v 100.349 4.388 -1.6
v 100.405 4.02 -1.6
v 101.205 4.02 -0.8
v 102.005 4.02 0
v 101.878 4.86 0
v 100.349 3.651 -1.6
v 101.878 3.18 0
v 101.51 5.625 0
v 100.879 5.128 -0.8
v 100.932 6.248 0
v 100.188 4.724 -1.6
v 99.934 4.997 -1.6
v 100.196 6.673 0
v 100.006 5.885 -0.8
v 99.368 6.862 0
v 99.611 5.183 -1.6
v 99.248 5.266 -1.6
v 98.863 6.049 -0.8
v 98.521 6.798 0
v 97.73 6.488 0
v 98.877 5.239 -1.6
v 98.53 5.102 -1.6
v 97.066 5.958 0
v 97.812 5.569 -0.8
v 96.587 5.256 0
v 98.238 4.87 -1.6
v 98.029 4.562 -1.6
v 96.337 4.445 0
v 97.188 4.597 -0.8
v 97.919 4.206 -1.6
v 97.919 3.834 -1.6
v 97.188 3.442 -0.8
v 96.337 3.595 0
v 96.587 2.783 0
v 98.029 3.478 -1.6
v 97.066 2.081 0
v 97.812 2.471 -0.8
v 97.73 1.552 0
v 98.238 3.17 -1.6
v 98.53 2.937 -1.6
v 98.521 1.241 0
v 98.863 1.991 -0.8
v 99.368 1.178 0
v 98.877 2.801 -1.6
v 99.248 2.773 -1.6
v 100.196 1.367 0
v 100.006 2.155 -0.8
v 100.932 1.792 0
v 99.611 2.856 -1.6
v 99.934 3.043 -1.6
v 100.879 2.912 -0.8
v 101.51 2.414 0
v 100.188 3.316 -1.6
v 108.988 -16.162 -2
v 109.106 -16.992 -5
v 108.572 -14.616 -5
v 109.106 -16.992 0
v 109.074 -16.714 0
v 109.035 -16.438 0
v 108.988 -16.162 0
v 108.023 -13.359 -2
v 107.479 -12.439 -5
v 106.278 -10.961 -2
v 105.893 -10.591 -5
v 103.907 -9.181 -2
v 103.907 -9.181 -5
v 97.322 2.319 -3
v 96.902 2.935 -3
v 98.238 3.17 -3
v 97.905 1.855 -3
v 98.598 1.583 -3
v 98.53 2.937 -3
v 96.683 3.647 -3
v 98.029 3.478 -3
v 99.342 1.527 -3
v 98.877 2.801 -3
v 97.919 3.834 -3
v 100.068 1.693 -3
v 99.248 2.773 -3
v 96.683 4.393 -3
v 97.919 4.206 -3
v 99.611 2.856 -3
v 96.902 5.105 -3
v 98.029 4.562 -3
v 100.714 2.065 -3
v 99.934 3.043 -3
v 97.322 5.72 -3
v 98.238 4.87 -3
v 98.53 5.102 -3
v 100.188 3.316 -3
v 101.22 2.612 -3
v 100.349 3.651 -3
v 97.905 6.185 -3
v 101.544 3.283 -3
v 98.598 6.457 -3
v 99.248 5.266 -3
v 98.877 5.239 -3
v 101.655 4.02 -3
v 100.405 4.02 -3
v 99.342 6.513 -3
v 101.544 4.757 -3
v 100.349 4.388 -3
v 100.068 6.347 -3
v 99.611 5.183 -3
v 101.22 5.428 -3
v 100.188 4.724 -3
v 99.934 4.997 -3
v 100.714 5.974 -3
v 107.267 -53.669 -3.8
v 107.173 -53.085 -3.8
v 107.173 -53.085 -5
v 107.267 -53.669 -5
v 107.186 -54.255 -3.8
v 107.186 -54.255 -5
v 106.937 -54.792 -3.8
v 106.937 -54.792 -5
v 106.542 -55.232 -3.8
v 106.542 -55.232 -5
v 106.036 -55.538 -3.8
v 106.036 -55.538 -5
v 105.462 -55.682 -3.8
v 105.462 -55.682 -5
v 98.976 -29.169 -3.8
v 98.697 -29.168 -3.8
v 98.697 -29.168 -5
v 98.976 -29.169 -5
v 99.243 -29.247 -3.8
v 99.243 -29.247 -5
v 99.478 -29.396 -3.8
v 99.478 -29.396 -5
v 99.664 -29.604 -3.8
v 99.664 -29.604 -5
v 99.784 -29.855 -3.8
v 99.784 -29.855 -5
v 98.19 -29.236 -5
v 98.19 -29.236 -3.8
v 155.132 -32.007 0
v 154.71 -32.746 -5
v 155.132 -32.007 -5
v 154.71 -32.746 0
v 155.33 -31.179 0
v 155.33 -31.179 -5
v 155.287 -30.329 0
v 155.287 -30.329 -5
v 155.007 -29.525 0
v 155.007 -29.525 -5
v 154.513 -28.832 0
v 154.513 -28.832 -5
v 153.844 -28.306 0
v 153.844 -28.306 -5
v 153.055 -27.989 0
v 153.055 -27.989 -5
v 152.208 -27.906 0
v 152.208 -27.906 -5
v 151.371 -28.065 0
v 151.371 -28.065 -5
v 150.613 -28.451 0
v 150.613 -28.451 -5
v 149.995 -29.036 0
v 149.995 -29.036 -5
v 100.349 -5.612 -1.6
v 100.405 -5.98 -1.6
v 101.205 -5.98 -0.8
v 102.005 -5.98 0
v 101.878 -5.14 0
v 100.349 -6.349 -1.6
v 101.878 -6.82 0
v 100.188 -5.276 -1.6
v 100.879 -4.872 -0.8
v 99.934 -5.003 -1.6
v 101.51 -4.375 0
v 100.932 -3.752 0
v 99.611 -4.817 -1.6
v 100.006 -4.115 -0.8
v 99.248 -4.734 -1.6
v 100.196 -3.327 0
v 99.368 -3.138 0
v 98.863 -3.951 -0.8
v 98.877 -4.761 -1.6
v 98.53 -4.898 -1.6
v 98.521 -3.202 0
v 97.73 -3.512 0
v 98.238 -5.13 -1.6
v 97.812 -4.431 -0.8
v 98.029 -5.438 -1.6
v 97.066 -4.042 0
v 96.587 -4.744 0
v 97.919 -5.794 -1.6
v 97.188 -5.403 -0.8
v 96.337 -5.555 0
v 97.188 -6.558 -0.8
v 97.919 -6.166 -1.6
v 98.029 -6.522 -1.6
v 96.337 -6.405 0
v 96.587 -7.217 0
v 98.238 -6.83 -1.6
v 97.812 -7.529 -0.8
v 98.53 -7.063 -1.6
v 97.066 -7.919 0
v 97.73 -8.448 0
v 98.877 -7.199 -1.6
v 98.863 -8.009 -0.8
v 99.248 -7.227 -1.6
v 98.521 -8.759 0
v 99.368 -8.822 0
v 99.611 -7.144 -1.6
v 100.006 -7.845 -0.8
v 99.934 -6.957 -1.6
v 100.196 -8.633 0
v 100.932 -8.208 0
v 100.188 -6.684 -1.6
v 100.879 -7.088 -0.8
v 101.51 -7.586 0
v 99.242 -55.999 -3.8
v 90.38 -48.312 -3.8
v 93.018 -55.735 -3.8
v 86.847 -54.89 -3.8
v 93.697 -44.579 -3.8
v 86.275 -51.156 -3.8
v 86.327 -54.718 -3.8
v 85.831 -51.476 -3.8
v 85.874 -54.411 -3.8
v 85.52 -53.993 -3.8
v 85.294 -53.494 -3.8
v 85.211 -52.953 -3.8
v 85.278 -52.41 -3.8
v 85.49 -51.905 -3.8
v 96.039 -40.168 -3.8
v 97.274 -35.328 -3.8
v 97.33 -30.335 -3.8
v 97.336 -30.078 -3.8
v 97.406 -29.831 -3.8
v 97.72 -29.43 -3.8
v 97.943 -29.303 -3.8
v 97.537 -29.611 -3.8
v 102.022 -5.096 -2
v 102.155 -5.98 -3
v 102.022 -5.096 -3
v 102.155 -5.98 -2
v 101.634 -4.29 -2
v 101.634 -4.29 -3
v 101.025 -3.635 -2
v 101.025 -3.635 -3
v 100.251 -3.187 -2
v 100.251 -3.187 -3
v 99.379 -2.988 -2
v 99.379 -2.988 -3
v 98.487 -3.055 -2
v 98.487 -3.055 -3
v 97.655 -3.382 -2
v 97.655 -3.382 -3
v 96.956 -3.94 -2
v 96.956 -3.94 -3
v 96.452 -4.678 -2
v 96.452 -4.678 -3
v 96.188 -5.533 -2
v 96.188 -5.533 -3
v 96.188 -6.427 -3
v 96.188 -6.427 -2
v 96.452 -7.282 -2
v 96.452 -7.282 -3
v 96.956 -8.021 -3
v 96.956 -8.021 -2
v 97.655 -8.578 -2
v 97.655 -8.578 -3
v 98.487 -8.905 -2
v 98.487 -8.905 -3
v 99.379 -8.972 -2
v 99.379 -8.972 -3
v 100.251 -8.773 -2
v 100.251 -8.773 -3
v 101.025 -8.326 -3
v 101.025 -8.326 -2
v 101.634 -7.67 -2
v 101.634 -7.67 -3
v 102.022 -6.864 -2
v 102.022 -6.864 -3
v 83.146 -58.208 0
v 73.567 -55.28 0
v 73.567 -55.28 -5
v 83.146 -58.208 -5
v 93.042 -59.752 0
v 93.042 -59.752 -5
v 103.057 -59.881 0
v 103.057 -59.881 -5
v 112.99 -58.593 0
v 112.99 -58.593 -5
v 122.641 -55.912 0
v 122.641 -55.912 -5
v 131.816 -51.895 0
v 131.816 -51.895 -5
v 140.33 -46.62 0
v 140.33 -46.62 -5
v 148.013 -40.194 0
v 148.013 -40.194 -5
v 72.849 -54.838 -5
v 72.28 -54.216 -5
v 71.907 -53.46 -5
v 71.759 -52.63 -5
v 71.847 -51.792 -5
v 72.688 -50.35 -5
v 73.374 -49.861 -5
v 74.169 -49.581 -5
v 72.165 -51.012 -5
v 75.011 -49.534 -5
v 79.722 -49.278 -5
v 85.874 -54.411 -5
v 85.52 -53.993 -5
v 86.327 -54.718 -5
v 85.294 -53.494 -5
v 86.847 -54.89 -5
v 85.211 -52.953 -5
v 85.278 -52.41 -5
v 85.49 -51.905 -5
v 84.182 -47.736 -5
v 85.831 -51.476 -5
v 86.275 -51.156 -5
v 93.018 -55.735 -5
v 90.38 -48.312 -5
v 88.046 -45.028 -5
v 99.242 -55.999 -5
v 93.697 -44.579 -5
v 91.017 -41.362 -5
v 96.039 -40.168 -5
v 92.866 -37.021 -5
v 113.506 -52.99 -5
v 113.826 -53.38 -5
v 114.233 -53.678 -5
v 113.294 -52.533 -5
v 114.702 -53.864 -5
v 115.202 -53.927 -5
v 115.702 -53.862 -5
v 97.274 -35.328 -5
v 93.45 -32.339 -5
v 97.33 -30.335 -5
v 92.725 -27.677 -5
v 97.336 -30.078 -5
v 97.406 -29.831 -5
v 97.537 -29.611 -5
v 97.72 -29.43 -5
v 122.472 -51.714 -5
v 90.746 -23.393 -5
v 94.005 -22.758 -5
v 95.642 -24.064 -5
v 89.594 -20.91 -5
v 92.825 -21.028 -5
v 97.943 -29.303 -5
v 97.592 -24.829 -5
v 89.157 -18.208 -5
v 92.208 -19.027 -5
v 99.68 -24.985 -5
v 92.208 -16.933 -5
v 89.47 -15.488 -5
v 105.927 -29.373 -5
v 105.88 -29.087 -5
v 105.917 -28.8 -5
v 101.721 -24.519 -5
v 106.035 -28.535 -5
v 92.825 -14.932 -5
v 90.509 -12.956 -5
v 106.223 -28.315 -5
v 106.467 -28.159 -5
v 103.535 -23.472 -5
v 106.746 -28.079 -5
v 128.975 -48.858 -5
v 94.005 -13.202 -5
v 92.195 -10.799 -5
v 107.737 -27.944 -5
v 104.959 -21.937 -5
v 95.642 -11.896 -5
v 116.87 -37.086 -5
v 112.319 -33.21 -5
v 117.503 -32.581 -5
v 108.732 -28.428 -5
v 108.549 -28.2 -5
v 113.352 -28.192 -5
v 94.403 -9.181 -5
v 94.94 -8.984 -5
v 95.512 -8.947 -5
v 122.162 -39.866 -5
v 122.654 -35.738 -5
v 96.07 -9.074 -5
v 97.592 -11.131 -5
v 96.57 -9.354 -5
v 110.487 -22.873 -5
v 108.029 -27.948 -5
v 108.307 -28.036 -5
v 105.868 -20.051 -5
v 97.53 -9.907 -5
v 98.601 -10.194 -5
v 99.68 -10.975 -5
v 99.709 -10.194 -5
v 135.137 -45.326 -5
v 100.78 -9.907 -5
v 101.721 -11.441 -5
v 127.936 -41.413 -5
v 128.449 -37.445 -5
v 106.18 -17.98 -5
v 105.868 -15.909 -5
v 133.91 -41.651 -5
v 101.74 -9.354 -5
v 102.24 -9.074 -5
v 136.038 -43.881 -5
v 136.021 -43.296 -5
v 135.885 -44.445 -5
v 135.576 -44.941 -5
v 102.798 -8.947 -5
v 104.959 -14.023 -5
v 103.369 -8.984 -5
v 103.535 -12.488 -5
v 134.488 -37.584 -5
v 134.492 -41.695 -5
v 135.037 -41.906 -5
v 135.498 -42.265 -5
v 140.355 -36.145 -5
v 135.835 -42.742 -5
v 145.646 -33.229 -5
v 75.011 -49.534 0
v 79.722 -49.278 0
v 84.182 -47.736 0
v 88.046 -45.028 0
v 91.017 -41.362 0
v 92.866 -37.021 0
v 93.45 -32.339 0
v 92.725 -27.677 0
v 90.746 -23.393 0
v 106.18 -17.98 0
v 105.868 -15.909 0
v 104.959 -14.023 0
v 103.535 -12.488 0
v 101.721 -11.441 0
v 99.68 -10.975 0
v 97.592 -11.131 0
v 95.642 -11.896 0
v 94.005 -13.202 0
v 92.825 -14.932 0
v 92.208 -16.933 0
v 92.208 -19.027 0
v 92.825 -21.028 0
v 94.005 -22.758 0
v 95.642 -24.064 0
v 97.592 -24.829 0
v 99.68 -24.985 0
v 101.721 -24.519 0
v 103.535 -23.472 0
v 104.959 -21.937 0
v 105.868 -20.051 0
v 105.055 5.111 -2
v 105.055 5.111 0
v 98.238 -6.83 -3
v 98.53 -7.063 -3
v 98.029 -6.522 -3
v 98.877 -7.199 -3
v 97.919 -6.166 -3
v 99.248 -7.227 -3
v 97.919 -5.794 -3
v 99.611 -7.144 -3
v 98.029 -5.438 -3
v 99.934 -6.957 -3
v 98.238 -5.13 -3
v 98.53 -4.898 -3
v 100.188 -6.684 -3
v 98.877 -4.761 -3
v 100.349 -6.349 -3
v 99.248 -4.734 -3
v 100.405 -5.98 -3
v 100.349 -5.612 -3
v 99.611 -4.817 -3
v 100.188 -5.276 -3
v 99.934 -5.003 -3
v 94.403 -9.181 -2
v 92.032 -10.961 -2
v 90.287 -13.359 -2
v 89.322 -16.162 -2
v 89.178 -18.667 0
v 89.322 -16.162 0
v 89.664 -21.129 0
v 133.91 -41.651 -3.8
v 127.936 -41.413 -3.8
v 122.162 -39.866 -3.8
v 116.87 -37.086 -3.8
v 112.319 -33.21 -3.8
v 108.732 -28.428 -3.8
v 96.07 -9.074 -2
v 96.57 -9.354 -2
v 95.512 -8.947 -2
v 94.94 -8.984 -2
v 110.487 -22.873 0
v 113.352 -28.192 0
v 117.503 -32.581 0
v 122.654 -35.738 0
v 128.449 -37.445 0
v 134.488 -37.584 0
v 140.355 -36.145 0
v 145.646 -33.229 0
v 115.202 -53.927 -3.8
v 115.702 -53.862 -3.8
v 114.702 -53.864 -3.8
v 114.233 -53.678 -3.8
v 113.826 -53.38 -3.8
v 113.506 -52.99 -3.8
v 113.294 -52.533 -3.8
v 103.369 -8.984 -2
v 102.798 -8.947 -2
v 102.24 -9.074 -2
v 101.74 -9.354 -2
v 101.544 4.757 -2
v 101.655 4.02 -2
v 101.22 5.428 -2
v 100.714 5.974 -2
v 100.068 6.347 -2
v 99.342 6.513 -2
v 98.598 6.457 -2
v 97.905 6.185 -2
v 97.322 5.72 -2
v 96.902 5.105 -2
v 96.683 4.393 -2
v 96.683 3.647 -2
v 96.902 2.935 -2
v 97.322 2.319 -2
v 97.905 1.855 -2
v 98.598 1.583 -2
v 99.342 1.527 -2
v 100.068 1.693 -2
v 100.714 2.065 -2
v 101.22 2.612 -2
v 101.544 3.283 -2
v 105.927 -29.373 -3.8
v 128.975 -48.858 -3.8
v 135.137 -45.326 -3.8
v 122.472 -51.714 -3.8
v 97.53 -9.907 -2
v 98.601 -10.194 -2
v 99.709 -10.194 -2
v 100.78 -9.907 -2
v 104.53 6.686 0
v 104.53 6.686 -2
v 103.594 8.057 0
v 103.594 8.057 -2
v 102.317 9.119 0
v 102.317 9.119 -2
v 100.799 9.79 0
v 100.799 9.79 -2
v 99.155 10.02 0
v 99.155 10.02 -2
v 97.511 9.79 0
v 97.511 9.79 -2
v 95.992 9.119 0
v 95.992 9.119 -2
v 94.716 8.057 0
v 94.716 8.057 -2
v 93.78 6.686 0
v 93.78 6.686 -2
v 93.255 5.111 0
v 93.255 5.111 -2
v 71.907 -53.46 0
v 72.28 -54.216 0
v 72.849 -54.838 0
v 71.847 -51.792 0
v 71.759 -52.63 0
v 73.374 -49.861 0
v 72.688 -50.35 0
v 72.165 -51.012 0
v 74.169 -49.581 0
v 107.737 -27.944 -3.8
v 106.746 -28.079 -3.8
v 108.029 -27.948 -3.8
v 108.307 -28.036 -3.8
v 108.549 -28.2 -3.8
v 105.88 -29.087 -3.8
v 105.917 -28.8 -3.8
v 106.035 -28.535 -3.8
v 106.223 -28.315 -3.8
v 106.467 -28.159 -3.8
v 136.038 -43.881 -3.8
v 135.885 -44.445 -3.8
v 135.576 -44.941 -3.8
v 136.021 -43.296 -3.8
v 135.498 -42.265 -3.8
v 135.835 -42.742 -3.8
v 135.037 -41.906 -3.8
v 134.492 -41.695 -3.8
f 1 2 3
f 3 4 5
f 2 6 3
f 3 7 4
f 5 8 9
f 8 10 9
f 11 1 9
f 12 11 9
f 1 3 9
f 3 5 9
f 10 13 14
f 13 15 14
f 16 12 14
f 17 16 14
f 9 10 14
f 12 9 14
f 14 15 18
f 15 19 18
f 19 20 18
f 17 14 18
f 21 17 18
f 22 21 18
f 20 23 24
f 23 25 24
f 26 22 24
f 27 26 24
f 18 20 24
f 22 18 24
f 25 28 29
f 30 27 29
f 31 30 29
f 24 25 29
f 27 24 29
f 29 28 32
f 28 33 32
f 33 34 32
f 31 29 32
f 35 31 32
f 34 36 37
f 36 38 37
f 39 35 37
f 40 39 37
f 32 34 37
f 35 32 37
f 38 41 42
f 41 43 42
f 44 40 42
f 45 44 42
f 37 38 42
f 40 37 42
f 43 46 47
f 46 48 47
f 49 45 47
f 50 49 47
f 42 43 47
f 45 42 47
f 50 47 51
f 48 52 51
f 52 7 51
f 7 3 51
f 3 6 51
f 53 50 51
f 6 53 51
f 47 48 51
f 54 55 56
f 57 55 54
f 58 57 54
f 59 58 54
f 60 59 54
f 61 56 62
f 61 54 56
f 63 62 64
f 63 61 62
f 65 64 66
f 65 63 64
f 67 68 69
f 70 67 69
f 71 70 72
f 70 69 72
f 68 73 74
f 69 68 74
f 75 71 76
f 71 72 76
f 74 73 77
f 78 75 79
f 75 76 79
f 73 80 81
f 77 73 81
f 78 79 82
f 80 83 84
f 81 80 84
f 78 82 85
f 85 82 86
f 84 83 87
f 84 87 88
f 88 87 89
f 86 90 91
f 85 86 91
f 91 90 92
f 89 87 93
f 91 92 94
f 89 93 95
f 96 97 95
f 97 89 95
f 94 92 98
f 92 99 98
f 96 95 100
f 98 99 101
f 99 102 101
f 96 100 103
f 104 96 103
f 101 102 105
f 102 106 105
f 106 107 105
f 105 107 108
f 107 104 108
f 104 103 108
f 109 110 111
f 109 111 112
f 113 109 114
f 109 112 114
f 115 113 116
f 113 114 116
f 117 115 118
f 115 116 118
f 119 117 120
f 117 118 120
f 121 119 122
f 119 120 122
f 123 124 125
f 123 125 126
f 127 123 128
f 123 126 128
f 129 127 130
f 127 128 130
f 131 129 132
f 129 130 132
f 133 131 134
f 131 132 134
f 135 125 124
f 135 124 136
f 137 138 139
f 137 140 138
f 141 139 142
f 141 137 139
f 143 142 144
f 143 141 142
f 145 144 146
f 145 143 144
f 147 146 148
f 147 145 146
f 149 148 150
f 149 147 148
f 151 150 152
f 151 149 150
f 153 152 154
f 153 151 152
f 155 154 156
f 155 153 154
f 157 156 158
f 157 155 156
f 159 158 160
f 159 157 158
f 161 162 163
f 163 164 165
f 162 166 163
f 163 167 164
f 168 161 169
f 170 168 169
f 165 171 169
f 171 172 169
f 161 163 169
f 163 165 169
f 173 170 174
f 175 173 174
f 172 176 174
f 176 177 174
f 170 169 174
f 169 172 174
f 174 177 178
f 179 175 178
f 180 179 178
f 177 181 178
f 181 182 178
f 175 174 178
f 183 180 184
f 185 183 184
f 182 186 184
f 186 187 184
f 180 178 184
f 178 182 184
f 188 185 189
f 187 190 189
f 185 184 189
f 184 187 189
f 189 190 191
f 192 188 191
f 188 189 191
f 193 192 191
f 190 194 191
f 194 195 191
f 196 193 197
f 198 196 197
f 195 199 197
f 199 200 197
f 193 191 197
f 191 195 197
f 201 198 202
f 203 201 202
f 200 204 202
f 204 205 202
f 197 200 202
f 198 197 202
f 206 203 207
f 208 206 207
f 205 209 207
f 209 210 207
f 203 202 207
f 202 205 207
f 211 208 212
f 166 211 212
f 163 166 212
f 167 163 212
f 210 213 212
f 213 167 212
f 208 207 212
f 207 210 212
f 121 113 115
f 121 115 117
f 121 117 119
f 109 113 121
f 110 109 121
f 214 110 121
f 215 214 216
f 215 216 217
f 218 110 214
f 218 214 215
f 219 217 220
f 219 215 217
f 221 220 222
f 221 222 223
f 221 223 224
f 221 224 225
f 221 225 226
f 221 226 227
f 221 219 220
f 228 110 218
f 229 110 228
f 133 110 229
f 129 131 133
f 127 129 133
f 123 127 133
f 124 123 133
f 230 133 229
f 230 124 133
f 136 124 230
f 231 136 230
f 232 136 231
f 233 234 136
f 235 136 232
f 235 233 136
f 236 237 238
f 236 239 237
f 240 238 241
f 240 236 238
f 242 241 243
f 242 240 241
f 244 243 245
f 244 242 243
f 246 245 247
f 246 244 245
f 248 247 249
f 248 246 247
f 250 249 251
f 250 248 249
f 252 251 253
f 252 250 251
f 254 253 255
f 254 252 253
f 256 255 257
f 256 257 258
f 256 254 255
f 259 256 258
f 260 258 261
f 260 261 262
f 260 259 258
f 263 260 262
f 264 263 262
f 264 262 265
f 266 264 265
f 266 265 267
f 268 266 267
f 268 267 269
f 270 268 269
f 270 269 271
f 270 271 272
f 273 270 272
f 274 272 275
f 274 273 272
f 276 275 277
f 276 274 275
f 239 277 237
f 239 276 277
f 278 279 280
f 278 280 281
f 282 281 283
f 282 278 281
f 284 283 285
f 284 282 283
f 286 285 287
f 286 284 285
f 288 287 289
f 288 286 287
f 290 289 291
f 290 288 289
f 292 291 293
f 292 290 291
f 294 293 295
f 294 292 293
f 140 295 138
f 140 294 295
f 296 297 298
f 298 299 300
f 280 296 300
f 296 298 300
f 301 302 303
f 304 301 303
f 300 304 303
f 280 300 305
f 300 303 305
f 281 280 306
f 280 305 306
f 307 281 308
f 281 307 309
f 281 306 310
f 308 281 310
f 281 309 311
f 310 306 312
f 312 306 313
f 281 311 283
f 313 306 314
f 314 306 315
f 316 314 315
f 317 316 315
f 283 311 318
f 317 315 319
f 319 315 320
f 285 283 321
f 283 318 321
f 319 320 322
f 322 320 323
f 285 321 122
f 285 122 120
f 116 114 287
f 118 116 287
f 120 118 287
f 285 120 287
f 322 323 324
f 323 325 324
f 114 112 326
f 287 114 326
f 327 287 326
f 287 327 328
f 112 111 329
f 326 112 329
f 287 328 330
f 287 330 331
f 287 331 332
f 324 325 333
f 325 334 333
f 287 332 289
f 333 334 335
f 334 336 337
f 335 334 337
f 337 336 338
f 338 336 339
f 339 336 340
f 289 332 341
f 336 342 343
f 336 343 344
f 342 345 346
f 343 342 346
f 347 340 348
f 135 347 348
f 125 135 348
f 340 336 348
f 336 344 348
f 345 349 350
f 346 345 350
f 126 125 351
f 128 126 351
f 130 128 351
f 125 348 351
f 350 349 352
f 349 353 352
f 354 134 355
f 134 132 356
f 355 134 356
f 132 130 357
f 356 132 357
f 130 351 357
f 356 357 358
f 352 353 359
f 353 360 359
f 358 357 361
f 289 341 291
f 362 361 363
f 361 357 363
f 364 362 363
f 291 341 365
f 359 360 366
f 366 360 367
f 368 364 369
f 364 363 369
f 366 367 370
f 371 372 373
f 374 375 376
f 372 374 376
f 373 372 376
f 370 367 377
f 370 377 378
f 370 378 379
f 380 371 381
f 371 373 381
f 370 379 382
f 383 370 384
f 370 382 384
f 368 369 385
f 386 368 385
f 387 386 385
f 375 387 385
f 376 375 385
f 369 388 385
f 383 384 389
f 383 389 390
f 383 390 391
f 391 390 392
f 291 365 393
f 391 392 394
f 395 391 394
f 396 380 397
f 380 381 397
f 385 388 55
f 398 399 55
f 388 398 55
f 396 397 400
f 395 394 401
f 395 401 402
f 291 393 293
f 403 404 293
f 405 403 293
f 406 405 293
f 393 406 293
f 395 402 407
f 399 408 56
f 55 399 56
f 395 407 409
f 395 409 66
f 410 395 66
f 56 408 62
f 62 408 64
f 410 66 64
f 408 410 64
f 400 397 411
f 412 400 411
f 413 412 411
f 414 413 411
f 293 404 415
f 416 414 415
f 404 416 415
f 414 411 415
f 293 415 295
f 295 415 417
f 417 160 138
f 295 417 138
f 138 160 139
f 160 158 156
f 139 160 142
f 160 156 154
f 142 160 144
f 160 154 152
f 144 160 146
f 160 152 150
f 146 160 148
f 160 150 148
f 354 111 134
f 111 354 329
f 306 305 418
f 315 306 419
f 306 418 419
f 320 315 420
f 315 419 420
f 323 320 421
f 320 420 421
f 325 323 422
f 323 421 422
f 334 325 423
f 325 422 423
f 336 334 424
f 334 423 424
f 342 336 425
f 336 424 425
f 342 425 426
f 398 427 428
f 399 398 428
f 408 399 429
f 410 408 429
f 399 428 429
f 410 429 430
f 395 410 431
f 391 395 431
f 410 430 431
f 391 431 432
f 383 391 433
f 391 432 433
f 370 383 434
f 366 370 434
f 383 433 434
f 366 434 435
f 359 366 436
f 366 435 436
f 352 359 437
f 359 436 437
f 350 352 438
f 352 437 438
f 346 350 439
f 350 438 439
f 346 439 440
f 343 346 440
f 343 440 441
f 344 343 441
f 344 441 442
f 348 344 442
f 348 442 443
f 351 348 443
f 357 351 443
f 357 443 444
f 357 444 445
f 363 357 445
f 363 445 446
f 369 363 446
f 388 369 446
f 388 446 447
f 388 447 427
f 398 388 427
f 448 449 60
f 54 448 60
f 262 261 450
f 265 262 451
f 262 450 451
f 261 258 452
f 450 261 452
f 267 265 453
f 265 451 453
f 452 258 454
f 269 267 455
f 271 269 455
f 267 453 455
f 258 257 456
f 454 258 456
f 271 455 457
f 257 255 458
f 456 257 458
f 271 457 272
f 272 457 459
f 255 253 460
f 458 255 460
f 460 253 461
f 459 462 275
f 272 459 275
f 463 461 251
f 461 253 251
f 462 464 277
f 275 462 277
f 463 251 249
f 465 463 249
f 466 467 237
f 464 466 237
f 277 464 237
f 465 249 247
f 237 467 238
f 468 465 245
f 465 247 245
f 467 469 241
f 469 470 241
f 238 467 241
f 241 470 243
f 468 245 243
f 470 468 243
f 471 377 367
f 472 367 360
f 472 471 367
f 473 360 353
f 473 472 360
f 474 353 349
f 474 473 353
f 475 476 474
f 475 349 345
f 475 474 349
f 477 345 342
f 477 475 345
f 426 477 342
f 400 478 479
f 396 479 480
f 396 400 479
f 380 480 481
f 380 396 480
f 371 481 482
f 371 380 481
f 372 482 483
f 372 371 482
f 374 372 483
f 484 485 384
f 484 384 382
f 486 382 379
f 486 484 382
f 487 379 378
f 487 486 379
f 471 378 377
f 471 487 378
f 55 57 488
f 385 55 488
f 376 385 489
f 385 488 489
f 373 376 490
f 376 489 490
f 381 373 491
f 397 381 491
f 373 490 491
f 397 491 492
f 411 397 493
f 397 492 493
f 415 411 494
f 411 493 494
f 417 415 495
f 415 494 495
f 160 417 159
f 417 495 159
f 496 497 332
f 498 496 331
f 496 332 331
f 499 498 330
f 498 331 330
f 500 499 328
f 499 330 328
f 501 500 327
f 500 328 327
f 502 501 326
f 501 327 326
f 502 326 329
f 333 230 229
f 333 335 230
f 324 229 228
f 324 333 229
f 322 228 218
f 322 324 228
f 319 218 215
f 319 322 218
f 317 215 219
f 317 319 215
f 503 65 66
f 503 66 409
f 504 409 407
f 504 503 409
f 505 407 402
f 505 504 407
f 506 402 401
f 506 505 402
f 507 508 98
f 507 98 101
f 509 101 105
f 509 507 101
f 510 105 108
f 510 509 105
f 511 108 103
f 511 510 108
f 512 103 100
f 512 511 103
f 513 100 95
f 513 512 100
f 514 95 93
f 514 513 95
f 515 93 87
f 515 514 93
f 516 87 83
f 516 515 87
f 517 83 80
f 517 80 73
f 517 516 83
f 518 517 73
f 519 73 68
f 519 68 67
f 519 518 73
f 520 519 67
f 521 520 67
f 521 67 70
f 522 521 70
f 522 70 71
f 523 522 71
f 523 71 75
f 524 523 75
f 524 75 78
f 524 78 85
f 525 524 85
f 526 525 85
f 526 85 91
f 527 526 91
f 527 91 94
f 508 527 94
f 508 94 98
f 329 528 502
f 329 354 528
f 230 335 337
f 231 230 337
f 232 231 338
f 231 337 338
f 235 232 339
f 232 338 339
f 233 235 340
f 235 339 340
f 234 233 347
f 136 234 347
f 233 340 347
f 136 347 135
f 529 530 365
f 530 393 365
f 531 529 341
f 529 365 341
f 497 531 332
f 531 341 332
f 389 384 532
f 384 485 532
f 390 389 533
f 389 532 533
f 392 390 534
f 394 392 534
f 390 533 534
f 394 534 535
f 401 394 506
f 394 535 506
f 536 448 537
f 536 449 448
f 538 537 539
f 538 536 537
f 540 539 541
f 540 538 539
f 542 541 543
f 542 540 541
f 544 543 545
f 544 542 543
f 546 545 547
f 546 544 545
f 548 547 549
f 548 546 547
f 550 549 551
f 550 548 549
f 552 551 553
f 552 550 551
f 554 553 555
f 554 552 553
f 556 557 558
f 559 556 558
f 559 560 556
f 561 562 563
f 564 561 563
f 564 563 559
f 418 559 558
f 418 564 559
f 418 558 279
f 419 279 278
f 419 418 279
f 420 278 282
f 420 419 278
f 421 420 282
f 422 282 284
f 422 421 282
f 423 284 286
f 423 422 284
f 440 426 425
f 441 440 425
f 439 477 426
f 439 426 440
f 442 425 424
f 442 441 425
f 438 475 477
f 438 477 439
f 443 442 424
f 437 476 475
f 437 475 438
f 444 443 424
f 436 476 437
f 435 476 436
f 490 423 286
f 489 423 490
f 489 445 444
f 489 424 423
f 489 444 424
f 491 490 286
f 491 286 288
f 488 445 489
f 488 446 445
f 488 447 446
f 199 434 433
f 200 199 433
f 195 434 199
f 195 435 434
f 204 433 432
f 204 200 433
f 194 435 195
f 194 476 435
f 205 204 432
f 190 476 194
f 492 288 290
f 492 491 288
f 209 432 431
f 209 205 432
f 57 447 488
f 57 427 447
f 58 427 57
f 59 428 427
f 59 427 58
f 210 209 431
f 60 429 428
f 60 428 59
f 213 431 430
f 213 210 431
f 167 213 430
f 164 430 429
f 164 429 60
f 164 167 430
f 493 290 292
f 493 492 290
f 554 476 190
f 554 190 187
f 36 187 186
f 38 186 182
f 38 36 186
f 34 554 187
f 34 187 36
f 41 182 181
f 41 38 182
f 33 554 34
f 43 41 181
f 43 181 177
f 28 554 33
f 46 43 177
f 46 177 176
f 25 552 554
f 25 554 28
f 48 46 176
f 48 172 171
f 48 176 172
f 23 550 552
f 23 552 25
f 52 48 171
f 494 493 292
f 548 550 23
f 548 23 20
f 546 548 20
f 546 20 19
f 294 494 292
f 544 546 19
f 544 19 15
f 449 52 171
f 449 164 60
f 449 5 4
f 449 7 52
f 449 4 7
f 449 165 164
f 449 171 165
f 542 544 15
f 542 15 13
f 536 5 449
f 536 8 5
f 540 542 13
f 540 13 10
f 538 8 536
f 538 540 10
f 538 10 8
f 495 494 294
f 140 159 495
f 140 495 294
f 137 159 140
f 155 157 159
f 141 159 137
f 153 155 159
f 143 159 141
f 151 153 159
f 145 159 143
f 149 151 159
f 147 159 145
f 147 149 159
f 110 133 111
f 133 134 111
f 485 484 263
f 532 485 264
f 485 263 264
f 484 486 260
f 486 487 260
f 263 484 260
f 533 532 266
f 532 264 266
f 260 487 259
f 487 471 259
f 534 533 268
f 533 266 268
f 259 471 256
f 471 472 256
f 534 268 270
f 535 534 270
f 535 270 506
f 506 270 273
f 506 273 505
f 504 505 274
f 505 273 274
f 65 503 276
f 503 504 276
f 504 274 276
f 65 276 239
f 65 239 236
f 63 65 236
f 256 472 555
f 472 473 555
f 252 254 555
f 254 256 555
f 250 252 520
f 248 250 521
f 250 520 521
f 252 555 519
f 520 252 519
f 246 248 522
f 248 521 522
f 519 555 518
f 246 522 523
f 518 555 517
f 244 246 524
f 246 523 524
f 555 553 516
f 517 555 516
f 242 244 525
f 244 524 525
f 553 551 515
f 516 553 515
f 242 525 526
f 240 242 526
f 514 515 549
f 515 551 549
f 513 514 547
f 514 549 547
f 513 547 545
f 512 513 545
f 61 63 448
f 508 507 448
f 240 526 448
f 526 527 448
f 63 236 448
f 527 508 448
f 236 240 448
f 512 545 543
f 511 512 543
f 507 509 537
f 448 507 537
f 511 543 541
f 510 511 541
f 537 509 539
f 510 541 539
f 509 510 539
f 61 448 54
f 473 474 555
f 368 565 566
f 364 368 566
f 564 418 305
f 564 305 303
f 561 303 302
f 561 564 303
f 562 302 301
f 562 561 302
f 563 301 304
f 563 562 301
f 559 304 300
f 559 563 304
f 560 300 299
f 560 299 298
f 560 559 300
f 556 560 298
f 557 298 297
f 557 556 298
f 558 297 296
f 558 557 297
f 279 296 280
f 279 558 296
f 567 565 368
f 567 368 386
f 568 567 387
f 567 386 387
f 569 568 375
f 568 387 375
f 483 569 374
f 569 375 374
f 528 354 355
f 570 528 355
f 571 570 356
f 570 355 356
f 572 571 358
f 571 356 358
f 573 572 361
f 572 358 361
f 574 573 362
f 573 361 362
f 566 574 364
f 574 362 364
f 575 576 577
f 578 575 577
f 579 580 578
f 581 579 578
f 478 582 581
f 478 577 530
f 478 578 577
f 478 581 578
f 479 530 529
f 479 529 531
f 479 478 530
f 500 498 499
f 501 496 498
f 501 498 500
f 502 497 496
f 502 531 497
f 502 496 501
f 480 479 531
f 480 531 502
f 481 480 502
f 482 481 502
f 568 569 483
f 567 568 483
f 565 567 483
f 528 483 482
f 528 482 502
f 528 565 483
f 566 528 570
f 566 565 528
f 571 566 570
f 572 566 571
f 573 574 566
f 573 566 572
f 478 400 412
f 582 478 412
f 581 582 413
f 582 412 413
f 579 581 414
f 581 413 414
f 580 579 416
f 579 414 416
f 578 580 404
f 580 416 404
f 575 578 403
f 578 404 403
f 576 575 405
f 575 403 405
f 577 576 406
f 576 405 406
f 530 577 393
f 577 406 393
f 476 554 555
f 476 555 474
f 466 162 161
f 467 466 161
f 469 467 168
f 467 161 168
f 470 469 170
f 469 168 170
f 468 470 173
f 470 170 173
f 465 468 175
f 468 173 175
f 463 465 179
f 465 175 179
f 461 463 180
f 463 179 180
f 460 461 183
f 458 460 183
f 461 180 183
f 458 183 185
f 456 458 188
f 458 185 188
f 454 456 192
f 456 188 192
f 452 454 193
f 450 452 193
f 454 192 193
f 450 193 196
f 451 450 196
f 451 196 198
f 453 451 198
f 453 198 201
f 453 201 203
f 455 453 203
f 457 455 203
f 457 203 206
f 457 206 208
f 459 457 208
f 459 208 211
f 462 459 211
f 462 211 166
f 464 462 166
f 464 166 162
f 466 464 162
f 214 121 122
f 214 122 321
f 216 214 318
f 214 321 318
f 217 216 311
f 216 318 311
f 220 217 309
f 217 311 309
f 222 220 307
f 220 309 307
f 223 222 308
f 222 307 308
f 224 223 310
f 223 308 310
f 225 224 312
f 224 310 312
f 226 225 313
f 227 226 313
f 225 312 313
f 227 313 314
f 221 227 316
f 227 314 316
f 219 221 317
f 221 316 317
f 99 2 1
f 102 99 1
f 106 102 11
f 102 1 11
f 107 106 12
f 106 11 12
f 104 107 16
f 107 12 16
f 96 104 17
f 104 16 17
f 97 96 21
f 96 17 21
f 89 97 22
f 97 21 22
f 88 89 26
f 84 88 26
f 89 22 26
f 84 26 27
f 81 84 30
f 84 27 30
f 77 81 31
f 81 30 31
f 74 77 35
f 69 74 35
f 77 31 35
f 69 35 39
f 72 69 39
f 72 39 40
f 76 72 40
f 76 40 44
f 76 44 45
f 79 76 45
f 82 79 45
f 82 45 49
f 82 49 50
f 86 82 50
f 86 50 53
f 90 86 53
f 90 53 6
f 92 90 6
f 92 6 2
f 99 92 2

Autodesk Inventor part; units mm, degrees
ref_plane "YZ Plane" through (0, 0, 0) normal (1, 0, 0) x (0, 1, 0)
ref_plane "XZ Plane" through (0, 0, 0) normal (0, 1, 0) x (-1, 0, 0)
ref_plane "XY Plane" through (0, 0, 0) normal (0, 0, 1) x (1, 0, 0)
sketch "Sketch1" plane through (0, 0, 0) normal (0, 0, 1) x (1, 0, 0)
  line L0 (64.2929, 13) -> (99.1548, 4.0199) construction
  circle A0 centre (64.2929, 13) radius 3 construction
  circle A1 centre (64.2929, 13) radius 4.025 construction
  circle A2 centre (64.2929, 13) radius 7 construction
  arc A3 (102.6474, 8.8986) -> (63.8399, 19.9853) centre (67.7221, -39.8889) ccw construction
  circle A4 centre (99.1548, 4.0199) radius 2.5
  circle A5 centre (99.1548, 4.0199) radius 3.525
  circle A6 centre (99.1548, 4.0199) radius 6
  line L1 (64.2929, 13) -> (98.9408, 0.0186) construction
  line L2 (99.1548, 4.0199) -> (99.1548, -17.9801) construction
  line L3 (99.1548, -17.9801) -> (98.9408, 0.0186) construction
  circle A7 centre (99.1548, -17.9801) radius 10
  circle A8 centre (99.1548, -17.9801) radius 7.025
  line L4 (105.0548, 5.1108) -> (108.9881, -16.162)
  line L5 (93.2548, 5.1108) -> (89.3215, -16.162)
  line L6 (9.3628, -60) -> (214.5663, -60) construction
  arc A9 (95.4028, -0.6623) -> (65.8301, 6.1709) centre (73.5161, -27.9748) ccw construction
  line L7 (99.1548, 4.0199) -> (73.567, -55.2798) construction
  line L8 (99.1548, 4.0199) -> (154.8581, -32.5547) construction
  circle A10 centre (74.7566, -52.523) radius 3
  circle A11 centre (152.3426, -30.903) radius 3
  arc A12 (75.0109, -49.5338) -> (90.7465, -23.3931) centre (76.4523, -32.595) ccw
  arc A13 (109.1059, -16.9921) -> (149.9946, -29.0357) centre (131.9933, -14.7194) ccw
  arc A14 (73.567, -55.2798) -> (154.8581, -32.5547) centre (98.9579, 10.6509) ccw
  circle A15 centre (99.1548, -5.9801) radius 1.25
  circle A16 centre (99.1548, -5.9801) radius 3
  circle A17 centre (99.1548, -5.9801) radius 4.25
  circle A18 centre (99.1548, 4.0199) radius 1.25
  arc A19 (103.9067, -9.1813) -> (101.7399, -9.3536) centre (102.9564, -10.9411) ccw
  arc A20 (96.5698, -9.3536) -> (94.4029, -9.1813) centre (95.3533, -10.9411) ccw
  point P0 (0, 0)
  point P1 (0, 0)
  point P2 (73.6834, -55.3244)
  point P3 (154.7099, -32.7457)
  point P4 (97.1242, -8.1885)
  point P5 (102.5276, -8.5661)
  point P6 (95.7821, -8.5661)
  dimension "d19" = 6
  dimension "d20" = 6
  dimension "d0" = 36
  dimension "d1" = 8.05
  dimension "d2" = 6
  dimension "d3" = 14
  dimension "d4" = 60
  dimension "d5" = 37
  dimension "d6" = 22
  dimension "d7" = 18
  dimension "d8" = 12
  dimension "d9" = 7.05
  dimension "d10" = 20
  dimension "d11" = 14.05
  dimension "d12" = 35
  dimension "d13" = 5
  dimension "d14" = 60
  dimension "d15" = 23.34
  dimension "d17" = 66.6375
  dimension "d18" = 64.5847
  dimension "d21" = 13
  dimension "d23" = 17
  dimension "d29" = 2.5
  dimension "d30" = 6
  dimension "d31" = 8.5
  dimension "d32" = 2.5
  dimension "d43" = 10
  dimension "d44" = 2
  dimension "d45" = 2
  dimension "d46" = 56.711
  dimension "d47" = 23
extrude "Extrusion5" add sketch "Sketch1" against normal blind 5 contours A10 | A7 A20 A17 A19 | A13 A11 A14 A10 A12 A7 | A11
extrude "Extrusion6" add sketch "Sketch1" against normal blind 2 contours A5 | A6 A17 | A6 L4 A7 A17 | A17 A7 A16 A6 | A6 A17 | A6 A17 A7 L5 | A19 A17 A7 | A17 A20 A7 | A7 A16 A17
extrude "Extrusion7" add sketch "Sketch1" against normal blind 3 contours A4 | A16 A7 | A7 A16
chamfer "Chamfer3" distance 1.6 angle 45 2 edges at (97.9048, 4.0199, 0) (97.9048, -5.9801, 0)
sketch "スケッチ5" plane through (0, 0, -5) normal (0, 0, -1) x (-1, 0, 0)
  arc A0 (-149.9946, -29.0357) -> (-154.7099, -32.7457) centre (-152.3426, -30.903) ccw projected
  arc A1 (-154.7099, -32.7457) -> (-73.6834, -55.3244) centre (-98.9579, 10.6509) ccw projected
  arc A2 (-73.6834, -55.3244) -> (-75.0109, -49.5338) centre (-74.7566, -52.523) ccw projected
  arc A3 (-90.7465, -23.3931) -> (-75.0109, -49.5338) centre (-76.4523, -32.595) ccw projected
  arc A4 (-90.7465, -23.3931) -> (-94.4029, -9.1813) centre (-99.1548, -17.9801) ccw projected
  arc A5 (-94.4029, -9.1813) -> (-96.5698, -9.3536) centre (-95.3533, -10.9411) ccw projected
  arc A6 (-101.7399, -9.3536) -> (-96.5698, -9.3536) centre (-99.1548, -5.9801) ccw projected
  arc A7 (-101.7399, -9.3536) -> (-103.9067, -9.1813) centre (-102.9564, -10.9411) ccw projected
  arc A8 (-103.9067, -9.1813) -> (-109.1059, -16.9921) centre (-99.1548, -17.9801) ccw projected
  arc A9 (-149.9946, -29.0357) -> (-109.1059, -16.9921) centre (-131.9933, -14.7194) ccw projected
  circle A10 centre (-99.1548, -17.9801) radius 7.025 projected
  arc A11 (-133.9095, -41.6513) -> (-108.7322, -28.4278) centre (-131.9933, -14.7194) ccw
  arc A12 (-107.7366, -27.9445) -> (-108.7322, -28.4278) centre (-107.8707, -28.9355) ccw
  line L0 (-107.7366, -27.9445) -> (-106.7456, -28.0786)
  arc A13 (-105.9268, -29.3727) -> (-106.7456, -28.0786) centre (-106.8797, -29.0696) ccw
  arc A14 (-149.9946, -29.0357) -> (-109.1059, -16.9921) centre (-131.9933, -14.7194) ccw projected
  line L1 (-125.4948, -36.7823) -> (-91.0171, -41.3623) construction
  arc A15 (-90.7465, -23.3931) -> (-75.0109, -49.5338) centre (-76.4523, -32.595) ccw projected
  line L2 (-125.4948, -36.7823) -> (-99.1548, -17.9801) construction
  line L3 (-99.1548, -17.9801) -> (-91.0171, -41.3623) construction
  line L4 (-99.1548, -17.9801) -> (-114.8496, -67.3215) construction
  line L5 (-105.9268, -29.3727) -> (-113.2937, -52.5329)
  line L6 (-104.7615, -24.3106) -> (-98.127, -25.2082) construction
  arc A16 (-133.9095, -41.6513) -> (-135.1371, -45.326) centre (-134.0514, -43.6463) ccw
  arc A17 (-135.1371, -45.326) -> (-115.702, -53.8625) centre (-98.9579, 10.6509) ccw
  arc A18 (-115.702, -53.8625) -> (-113.2937, -52.5329) centre (-115.1996, -51.9266) ccw
  line L7 (-99.7841, -29.8554) -> (-107.1731, -53.0852)
  arc A19 (-98.697, -29.1675) -> (-99.7841, -29.8554) centre (-98.8311, -30.1585) ccw
  arc A20 (-97.3303, -30.3347) -> (-98.1904, -29.2361) centre (-98.3245, -30.227) ccw
  line L8 (-98.697, -29.1675) -> (-98.1904, -29.2361)
  arc A21 (-97.3303, -30.3347) -> (-86.2751, -51.156) centre (-76.4523, -32.595) ccw
  arc A22 (-86.8471, -54.8905) -> (-86.2751, -51.156) centre (-87.2106, -52.9238) ccw
  arc A23 (-107.1731, -53.0852) -> (-105.4624, -55.6819) centre (-105.2672, -53.6914) ccw
  arc A24 (-105.4624, -55.6819) -> (-86.8471, -54.8905) centre (-98.9579, 10.6509) ccw
  point P0 (0, 0)
  dimension "d57" = 1
  dimension "d58" = 1
  dimension "d59" = 4
  dimension "d60" = 73.669
  dimension "d61" = 36.835
  dimension "d62" = 3
  dimension "d63" = 1
  dimension "d64" = 4
  dimension "d66" = 2
  dimension "d67" = 4
  dimension "d68" = 2
  dimension "d70" = 3
  dimension "d71" = 1
  dimension "d72" = 1
  dimension "d73" = 4
  dimension "d74" = 4
  dimension "d75" = 2
  dimension "d76" = 2
  dimension "d77" = 4
extrude "押し出し8" cut sketch "スケッチ5" against normal blind 1.2 contours A11 A12 L0 A13 L5 A18 A17 A16 | A19 L8 A20 A21 A22 A24 A23 L7
properties part number "ヘッケン" material "ポリカーボネート、クリア"
